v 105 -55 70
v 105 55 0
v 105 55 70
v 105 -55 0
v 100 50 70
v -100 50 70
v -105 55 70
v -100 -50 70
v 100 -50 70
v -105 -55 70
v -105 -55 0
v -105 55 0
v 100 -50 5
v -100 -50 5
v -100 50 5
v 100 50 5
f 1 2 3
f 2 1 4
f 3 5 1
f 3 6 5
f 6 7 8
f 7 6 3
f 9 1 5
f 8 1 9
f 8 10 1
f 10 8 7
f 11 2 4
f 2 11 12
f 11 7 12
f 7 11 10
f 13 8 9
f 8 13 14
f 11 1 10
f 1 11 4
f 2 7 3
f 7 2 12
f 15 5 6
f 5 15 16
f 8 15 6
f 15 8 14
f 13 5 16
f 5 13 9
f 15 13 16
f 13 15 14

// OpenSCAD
/*
Parametric box

Description: Print a box to hold a given number of items of a specified size.

Configuration:
- Uncomment one of the "Size configuration" sections.
- Set the items variable to the desired amount.
- Set wall_thickness if you want to.
- Check the size of the resulting model before printing!

Git repository: http://github.com/l0b0/parametric-box

Copyright (C) 2010 Victor Engmark

This program is free software: you can redistribute it and/or modify it under the terms of the GNU General Public License as published by the Free Software Foundation, either version 3 of the License, or (at your option) any later version.

This program is distributed in the hope that it will be useful, but WITHOUT ANY WARRANTY; without even the implied warranty of MERCHANTABILITY or FITNESS FOR A PARTICULAR PURPOSE.  See the GNU General Public License for more details.

You should have received a copy of the GNU General Public License along with this program.  If not, see <http://www.gnu.org/licenses/>.
*/

/*
Size configuration
Uncomment one of the sections below or set your own
The sizes are as seen from the "front", i.e., the cover of a book or CD.
*/

// Default size in case of no configuration
item_width = 65;
item_height = 100;
item_depth = 25;

/*
// Jewel case <http://en.wikipedia.org/wiki/Optical_disc_packaging#Jewelry_case>, the common size for CDs:
item_width = 142;
item_height = 125;
item_depth = 10;
*/

/*
// Slimline jewel case <http://en.wikipedia.org/wiki/Optical_disc_packaging#Slimline_jewel_case>, used for CD singles:
item_width = 142;
item_height = 125;
item_depth = 7;
*/

// Items configuration
// Set how many items you want to be able to fit inside the box.
items = 8;

// Wall configuration
// Set how thick you want the wall (depends too much on aesthetics to auto-generate).
wall_thickness = 5;

module debug_item() {
    cube(size = [item_depth, item_height, item_width]);
}

module debug_items() {
    translate([-exterior_x / 2, -exterior_y / 2, 0]) {
        for( index = [0:items - 1] ) {
            translate ([index * item_depth + wall_thickness, wall_thickness, wall_thickness]) {
                debug_item();
            }
        }
    }
}

// Uncomment this if you want to see the items themselves
//# debug_items();


interior_x = items * item_depth;
interior_y = item_height;
interior_z = item_width;

exterior_x = interior_x + 2 * wall_thickness;
exterior_y = interior_y + 2 * wall_thickness;
exterior_z = interior_z + wall_thickness; // Smaller because of the opening

module top_bottom_plate() {
    cube(size = [exterior_x, wall_thickness, exterior_z]);    
}

module top_bottom() {
    union() {
        top_bottom_plate();
        translate([0, interior_y + wall_thickness, 0]) {
            top_bottom_plate();
        }
    }
}

module left_right_plate() {
    cube(size = [wall_thickness, exterior_y, exterior_z]);        
}

module left_right() {
    union() {
        left_right_plate();
        translate([interior_x + wall_thickness, 0, 0]) {
            left_right_plate();
        }
    }    
}

module back() {
    cube(size = [exterior_x, exterior_y, wall_thickness]);
}

module box() {
    translate([-exterior_x / 2, -exterior_y / 2, 0]) {
        union() {
            top_bottom();
            left_right();
            back();
        }
    }
}

box();
